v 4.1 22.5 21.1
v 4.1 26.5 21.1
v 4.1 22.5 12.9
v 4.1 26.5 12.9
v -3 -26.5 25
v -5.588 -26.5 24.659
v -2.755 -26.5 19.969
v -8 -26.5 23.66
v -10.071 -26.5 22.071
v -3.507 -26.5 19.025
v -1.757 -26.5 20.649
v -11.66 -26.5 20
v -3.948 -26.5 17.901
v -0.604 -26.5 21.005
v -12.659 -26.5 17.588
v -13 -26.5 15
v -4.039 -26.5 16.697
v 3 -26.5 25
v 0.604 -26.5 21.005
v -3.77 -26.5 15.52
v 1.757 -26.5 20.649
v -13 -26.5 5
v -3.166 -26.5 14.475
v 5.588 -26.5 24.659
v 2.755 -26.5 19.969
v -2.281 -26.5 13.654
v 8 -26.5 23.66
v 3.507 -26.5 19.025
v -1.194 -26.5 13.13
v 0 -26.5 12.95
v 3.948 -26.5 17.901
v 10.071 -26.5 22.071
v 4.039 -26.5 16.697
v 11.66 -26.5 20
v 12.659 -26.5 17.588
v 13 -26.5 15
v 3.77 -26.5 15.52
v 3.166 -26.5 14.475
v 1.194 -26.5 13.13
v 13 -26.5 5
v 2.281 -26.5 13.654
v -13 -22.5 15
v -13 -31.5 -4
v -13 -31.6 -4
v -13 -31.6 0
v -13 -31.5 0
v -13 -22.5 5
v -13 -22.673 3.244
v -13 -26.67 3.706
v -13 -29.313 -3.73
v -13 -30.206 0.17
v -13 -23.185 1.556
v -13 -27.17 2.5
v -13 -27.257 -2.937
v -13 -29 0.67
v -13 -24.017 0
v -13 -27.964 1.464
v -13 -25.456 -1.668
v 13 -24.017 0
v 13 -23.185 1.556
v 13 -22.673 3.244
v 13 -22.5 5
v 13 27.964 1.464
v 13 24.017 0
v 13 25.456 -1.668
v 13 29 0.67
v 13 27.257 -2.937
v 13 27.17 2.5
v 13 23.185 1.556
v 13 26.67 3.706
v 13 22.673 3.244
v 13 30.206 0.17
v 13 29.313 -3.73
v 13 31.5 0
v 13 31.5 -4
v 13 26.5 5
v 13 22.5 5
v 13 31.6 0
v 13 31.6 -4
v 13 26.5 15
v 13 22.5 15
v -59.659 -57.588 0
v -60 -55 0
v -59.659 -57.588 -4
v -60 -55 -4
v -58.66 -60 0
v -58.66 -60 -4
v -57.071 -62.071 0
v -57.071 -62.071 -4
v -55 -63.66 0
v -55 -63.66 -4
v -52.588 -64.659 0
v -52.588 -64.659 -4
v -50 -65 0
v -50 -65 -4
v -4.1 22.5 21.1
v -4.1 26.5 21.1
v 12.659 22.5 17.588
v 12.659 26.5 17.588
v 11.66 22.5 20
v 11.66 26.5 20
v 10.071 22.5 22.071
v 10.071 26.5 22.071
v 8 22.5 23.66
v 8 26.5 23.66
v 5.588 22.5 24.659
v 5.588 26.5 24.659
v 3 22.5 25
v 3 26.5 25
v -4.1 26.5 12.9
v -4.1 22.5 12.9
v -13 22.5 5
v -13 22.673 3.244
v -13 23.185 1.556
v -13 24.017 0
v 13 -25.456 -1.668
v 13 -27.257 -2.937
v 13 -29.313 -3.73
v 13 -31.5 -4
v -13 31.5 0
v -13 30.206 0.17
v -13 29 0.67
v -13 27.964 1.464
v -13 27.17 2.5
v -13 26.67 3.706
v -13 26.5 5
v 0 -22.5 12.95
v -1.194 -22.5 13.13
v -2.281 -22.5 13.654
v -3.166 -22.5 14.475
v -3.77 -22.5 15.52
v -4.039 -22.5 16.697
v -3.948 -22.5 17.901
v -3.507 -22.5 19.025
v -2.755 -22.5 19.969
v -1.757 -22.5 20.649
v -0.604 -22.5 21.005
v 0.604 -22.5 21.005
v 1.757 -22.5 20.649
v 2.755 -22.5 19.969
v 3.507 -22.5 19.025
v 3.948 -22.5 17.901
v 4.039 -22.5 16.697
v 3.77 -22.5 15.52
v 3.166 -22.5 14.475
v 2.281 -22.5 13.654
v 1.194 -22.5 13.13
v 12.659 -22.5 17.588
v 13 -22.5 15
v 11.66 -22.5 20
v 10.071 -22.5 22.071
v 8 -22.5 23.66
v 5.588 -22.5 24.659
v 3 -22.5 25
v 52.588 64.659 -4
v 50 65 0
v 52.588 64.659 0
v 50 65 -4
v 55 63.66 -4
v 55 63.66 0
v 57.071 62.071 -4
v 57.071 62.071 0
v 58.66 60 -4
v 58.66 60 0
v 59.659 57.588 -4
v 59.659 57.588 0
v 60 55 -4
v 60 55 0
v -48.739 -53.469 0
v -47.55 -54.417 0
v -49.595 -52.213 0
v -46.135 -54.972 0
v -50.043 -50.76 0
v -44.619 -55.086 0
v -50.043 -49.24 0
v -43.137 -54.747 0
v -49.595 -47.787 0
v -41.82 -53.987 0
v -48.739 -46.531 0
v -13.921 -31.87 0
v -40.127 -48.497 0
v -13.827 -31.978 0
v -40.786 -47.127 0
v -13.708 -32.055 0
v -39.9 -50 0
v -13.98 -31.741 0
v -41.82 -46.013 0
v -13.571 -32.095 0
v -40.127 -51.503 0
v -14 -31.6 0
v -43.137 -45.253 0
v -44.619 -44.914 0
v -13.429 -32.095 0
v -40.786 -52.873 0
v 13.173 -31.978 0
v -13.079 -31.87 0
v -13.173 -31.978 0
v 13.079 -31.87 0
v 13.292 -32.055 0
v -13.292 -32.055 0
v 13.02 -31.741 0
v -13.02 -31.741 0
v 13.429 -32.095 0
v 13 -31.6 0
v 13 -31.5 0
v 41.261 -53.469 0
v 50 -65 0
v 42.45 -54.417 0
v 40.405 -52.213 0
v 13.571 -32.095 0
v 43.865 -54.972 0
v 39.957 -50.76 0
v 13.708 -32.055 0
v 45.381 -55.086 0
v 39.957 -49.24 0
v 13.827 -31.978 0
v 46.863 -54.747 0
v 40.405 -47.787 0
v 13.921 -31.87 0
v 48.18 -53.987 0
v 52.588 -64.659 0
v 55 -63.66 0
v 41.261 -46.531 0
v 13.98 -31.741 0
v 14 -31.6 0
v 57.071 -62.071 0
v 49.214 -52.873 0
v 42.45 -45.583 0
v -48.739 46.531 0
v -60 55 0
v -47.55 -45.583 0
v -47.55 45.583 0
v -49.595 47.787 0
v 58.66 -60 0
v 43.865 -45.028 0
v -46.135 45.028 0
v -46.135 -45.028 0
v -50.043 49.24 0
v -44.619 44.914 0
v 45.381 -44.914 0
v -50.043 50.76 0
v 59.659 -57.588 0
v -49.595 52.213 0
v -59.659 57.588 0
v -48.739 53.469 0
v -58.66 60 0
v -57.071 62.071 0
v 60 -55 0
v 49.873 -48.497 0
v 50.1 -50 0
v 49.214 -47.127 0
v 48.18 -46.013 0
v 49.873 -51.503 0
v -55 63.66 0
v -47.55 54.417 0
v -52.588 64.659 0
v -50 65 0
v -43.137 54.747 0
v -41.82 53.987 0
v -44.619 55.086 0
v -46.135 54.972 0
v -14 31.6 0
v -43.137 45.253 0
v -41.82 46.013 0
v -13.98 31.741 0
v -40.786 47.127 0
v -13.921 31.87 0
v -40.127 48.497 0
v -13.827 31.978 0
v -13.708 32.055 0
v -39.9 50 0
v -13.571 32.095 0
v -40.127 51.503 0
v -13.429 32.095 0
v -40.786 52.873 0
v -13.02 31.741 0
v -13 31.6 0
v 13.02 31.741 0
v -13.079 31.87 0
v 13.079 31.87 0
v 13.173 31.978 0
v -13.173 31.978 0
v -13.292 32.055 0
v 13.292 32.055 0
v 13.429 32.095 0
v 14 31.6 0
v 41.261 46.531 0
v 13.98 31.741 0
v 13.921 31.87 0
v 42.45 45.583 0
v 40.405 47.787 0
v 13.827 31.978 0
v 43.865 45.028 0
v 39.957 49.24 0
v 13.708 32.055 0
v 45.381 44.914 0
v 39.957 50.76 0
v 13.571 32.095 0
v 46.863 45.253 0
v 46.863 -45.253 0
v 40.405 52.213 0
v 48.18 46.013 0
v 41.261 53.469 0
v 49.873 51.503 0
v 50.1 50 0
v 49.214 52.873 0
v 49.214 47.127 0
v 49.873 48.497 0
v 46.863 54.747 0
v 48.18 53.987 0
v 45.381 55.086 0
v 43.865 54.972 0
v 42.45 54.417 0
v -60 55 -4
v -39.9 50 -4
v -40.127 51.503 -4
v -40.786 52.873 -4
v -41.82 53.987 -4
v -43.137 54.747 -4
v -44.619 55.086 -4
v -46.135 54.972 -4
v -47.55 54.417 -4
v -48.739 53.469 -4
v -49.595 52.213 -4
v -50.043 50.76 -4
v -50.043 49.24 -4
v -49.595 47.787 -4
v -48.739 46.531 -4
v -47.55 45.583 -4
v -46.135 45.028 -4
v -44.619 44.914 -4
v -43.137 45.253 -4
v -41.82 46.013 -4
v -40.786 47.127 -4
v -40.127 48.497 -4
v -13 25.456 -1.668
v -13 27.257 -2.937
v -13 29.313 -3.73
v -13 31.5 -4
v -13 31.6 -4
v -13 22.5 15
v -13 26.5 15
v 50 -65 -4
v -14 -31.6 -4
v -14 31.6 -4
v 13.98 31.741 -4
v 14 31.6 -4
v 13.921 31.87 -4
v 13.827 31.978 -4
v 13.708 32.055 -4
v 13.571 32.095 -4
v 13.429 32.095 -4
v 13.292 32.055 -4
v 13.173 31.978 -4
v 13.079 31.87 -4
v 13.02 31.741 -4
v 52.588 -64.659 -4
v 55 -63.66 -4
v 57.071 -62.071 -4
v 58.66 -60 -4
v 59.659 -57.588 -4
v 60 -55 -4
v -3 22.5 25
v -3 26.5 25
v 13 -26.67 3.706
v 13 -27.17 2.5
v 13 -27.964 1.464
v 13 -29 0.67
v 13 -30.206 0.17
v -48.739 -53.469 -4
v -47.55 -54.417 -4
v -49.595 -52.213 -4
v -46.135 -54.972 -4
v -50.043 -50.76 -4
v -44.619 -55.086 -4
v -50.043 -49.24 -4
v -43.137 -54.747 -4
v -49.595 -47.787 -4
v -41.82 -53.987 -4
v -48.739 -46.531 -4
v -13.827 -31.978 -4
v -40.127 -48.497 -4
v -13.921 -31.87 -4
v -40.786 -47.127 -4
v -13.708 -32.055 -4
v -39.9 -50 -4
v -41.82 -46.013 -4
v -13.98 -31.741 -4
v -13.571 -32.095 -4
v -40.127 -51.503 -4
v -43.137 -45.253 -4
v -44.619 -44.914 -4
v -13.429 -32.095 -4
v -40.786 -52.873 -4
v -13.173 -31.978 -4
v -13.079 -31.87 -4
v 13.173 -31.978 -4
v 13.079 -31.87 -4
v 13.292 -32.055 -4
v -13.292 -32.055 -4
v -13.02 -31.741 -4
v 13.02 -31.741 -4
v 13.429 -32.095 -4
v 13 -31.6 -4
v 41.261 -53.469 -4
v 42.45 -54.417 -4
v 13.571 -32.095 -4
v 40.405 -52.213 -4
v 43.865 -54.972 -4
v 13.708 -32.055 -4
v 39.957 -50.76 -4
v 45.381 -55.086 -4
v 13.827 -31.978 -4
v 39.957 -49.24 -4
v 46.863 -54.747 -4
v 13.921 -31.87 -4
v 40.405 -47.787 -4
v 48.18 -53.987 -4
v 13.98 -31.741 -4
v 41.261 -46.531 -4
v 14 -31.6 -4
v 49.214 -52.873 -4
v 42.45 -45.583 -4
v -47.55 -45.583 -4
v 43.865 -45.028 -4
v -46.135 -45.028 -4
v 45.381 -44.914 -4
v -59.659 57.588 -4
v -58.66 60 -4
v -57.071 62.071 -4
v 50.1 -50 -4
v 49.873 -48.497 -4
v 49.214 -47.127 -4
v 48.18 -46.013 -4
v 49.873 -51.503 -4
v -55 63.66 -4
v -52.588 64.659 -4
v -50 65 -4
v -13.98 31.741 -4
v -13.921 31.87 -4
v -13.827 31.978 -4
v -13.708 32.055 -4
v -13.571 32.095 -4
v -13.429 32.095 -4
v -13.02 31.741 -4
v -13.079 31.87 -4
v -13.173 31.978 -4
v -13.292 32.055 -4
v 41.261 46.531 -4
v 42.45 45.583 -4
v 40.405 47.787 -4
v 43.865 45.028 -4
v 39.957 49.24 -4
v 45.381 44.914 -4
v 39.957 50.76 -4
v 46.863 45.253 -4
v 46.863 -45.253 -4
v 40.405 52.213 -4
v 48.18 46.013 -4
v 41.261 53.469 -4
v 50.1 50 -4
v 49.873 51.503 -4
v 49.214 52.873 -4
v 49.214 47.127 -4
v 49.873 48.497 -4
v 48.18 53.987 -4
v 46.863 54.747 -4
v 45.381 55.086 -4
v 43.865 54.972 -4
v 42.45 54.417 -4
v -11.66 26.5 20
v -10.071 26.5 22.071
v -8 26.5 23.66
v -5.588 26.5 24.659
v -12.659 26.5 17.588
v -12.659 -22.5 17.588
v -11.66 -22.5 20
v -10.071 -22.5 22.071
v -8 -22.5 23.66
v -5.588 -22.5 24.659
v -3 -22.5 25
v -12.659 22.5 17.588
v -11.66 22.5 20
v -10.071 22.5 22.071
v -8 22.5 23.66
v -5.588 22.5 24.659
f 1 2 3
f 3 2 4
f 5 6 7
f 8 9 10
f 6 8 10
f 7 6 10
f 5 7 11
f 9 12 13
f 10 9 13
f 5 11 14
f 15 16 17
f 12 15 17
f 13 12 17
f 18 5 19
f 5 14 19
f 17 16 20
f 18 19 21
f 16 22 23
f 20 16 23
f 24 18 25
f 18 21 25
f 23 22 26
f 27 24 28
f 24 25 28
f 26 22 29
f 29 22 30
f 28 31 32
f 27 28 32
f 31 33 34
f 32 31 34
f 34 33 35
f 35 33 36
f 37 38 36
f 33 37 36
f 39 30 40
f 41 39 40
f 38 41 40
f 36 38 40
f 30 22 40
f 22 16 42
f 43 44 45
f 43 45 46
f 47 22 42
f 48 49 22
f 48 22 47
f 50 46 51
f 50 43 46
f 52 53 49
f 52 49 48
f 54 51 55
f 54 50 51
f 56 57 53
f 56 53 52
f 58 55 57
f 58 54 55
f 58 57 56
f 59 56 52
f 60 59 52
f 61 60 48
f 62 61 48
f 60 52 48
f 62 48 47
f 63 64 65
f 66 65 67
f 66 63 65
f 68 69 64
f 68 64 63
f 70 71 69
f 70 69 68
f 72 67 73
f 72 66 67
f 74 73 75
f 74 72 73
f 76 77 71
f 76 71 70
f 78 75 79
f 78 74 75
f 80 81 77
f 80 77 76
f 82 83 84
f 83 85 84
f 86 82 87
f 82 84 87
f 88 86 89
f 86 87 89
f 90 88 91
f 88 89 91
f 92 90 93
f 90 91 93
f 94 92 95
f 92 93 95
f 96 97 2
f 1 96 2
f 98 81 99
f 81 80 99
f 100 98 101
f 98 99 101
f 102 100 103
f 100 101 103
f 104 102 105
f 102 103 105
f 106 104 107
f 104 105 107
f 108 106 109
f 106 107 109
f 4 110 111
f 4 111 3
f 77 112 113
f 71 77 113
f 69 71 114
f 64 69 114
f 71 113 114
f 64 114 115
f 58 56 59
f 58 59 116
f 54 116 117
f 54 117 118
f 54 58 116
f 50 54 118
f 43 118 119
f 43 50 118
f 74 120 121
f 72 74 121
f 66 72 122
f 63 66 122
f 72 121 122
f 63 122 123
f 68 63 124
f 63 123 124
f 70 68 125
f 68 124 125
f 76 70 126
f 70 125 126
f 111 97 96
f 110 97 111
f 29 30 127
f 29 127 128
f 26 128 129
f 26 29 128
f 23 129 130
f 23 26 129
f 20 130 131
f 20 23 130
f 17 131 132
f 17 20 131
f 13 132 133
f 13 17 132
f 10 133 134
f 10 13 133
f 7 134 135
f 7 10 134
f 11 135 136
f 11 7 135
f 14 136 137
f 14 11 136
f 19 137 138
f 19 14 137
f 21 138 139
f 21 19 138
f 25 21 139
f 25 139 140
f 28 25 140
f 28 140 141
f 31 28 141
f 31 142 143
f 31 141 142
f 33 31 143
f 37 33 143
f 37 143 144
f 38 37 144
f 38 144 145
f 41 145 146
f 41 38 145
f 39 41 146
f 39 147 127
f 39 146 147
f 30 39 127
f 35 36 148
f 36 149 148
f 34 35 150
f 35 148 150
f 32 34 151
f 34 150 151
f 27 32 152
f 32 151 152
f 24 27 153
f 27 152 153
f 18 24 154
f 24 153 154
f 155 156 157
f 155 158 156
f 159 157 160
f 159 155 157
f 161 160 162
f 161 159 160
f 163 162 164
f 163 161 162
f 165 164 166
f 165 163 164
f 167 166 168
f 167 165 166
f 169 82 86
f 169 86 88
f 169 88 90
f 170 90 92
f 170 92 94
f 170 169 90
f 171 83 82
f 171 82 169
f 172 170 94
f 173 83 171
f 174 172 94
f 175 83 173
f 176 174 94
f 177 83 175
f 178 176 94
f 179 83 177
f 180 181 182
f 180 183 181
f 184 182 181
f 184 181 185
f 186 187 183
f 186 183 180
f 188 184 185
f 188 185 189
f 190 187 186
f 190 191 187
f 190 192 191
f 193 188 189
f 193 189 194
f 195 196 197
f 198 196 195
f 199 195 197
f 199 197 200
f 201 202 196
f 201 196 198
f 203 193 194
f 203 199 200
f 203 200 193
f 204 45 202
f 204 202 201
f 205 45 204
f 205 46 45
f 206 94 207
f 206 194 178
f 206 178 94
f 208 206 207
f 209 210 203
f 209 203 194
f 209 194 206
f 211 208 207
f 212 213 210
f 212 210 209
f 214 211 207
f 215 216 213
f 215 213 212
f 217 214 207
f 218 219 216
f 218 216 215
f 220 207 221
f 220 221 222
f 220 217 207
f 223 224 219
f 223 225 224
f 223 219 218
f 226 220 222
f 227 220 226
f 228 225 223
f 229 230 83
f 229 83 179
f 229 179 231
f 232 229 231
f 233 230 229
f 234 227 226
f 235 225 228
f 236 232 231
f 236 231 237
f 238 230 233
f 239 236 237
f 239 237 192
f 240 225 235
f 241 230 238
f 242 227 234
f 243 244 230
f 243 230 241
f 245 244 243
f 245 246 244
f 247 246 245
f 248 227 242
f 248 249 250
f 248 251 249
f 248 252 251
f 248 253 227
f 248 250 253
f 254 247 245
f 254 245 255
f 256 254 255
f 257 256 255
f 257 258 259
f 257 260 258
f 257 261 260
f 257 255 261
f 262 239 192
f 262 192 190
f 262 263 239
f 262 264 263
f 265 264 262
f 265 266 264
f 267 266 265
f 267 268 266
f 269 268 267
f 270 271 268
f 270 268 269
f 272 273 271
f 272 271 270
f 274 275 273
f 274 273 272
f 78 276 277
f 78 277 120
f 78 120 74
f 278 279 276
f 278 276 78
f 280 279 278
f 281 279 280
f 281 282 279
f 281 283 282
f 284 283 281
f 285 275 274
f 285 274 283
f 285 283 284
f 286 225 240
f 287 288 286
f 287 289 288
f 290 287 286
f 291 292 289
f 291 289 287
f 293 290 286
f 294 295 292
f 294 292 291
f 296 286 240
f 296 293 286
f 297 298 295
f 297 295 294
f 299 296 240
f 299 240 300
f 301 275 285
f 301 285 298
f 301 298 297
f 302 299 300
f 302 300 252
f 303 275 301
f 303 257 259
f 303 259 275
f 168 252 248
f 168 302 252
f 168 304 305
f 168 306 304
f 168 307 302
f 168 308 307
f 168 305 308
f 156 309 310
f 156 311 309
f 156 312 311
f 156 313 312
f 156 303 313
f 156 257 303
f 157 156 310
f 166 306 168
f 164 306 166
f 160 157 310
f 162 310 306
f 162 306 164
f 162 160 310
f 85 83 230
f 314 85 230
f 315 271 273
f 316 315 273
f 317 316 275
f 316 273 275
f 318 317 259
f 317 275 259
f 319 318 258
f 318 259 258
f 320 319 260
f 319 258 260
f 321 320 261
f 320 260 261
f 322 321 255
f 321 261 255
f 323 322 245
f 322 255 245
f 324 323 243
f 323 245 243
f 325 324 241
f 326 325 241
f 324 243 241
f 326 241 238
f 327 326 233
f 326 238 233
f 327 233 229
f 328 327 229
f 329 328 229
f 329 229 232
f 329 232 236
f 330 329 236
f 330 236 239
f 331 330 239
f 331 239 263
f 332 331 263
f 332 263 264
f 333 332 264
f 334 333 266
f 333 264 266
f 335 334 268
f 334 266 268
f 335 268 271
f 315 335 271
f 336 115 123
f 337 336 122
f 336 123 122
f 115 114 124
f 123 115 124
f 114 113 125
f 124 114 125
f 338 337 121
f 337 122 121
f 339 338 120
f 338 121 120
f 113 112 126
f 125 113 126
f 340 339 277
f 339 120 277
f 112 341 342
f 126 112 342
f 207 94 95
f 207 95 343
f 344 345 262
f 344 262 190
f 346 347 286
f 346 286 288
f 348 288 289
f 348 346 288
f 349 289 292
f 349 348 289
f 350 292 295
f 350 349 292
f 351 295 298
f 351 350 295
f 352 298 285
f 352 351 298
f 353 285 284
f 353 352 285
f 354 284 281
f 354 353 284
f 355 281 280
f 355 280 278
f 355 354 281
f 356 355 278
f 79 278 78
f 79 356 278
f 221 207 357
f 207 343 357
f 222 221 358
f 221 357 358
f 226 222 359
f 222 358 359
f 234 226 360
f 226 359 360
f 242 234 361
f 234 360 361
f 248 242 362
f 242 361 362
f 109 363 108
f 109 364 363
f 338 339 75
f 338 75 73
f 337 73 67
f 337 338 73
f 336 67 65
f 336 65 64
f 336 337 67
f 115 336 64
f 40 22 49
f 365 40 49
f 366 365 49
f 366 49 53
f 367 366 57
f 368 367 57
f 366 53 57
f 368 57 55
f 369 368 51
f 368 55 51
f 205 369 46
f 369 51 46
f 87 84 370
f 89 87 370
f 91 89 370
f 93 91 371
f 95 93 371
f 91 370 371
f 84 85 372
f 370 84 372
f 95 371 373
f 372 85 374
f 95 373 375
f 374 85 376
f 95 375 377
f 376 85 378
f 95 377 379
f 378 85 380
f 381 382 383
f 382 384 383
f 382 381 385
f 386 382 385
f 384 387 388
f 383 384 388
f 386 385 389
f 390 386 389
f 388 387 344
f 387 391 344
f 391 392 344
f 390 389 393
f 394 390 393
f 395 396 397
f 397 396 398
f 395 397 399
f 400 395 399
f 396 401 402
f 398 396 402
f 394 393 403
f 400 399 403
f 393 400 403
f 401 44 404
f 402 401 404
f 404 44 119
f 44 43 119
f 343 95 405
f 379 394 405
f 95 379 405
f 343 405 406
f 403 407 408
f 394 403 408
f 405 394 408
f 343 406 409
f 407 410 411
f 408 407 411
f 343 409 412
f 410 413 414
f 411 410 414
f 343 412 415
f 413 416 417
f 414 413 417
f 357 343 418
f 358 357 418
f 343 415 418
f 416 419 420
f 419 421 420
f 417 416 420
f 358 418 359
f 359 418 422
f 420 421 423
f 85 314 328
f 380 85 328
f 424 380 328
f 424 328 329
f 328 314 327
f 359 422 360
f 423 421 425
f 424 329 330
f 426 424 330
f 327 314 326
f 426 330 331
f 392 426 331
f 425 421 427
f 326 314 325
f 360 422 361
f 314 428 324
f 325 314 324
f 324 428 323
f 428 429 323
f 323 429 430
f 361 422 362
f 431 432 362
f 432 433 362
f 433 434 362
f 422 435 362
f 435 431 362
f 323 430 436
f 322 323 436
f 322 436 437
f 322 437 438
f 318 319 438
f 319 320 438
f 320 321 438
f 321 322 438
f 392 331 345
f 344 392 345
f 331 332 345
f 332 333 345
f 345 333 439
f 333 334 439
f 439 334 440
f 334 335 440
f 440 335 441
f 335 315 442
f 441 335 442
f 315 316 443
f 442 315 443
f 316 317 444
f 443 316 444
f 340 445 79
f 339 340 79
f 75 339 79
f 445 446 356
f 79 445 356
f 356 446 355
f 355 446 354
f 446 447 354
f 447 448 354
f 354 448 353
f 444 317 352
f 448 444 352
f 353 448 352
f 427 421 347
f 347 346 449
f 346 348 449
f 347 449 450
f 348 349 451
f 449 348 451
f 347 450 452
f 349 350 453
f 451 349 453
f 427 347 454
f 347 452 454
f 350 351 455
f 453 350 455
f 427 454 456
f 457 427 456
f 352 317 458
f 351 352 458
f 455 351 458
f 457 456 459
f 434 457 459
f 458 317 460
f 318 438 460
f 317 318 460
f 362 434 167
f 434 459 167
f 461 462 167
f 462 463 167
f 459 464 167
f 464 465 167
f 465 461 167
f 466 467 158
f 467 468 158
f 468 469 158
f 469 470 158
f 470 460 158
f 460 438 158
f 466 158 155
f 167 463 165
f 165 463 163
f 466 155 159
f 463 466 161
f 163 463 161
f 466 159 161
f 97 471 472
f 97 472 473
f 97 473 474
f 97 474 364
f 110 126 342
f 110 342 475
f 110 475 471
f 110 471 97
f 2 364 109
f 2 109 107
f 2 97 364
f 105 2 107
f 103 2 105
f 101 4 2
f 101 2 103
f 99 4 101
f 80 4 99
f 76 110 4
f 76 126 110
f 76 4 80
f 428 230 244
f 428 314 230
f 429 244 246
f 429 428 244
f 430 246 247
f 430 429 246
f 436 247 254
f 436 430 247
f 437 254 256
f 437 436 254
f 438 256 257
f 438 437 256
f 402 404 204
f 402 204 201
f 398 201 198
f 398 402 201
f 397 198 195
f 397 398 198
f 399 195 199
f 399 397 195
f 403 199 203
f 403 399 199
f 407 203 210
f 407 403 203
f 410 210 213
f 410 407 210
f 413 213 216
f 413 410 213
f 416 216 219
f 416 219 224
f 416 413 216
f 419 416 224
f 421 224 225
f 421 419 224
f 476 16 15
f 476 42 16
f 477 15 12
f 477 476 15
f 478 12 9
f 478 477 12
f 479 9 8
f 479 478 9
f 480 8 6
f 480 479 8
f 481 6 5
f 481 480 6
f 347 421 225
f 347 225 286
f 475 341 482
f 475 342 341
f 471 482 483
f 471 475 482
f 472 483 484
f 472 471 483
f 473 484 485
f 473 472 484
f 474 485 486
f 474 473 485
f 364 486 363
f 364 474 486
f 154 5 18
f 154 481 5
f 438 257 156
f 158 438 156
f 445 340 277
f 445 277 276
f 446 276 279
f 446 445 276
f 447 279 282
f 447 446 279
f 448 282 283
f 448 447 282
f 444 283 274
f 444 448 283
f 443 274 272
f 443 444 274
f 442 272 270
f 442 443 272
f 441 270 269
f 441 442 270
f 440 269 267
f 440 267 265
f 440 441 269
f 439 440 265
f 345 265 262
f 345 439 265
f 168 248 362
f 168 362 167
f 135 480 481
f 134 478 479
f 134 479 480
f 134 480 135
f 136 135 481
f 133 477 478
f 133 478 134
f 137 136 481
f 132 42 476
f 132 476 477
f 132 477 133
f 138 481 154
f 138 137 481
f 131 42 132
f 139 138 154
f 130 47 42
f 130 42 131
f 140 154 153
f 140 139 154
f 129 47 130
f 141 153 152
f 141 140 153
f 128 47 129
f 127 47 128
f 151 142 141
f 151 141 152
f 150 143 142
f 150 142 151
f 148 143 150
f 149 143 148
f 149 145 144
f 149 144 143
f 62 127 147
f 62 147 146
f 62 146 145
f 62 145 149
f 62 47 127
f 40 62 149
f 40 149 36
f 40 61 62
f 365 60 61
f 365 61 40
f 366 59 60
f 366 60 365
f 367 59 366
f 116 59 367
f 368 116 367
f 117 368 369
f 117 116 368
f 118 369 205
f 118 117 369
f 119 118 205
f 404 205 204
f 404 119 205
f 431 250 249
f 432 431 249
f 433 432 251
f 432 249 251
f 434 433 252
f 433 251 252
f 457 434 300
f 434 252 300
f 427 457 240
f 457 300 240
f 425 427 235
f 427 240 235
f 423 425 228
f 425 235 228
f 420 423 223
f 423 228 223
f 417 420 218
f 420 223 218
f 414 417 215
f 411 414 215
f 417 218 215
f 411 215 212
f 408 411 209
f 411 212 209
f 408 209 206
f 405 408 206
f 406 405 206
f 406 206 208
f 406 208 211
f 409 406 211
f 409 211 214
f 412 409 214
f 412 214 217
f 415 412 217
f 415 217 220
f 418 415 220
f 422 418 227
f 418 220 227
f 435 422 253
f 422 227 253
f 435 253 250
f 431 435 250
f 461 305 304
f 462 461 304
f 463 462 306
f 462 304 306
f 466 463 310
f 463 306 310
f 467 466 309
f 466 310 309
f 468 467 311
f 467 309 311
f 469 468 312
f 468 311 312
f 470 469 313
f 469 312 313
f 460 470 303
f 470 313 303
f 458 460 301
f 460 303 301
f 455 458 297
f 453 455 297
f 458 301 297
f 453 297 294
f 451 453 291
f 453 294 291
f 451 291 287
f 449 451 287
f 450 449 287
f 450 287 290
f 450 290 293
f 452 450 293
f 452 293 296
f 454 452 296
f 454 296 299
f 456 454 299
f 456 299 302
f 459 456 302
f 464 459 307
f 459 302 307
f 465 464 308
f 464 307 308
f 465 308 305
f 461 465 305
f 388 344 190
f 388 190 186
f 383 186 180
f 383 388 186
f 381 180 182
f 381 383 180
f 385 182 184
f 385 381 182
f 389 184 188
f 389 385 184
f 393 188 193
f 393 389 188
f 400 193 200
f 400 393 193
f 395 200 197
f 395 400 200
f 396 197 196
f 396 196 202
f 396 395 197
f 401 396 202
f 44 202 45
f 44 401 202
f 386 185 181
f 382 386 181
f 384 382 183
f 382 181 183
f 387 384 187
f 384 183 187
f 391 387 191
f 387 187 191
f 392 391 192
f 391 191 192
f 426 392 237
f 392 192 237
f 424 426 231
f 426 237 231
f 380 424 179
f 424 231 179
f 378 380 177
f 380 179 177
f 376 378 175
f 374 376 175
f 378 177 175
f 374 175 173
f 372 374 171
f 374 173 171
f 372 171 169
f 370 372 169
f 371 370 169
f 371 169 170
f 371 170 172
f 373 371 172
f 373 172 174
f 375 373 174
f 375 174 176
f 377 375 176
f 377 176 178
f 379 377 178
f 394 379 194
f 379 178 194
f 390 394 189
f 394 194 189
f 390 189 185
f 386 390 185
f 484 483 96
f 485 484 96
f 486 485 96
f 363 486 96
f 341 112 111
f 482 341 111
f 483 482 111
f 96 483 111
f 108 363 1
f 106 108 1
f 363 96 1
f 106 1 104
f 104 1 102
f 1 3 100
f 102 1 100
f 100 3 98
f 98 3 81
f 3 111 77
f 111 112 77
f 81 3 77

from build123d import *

# Parameters (mm, degrees)
SKETCH_1_W                   = 120
SKETCH_1_H                   = 130
SKETCH_1_W_2                 = 28
SKETCH_1_H_2                 = 45
SM_BASE_FLANGE_1_DEPTH       = 4
SM_START                     = -4
SM_EDGE_FLANGE_1_DEPTH       = 4
SM_EDGE_FLANGE_1_2_OUTLINE_W = 26
SM_EDGE_FLANGE_1_2_OUTLINE_H = 4
SM_EDGE_FLANGE_1_2_DEPTH     = 0.41096
SM_START_2                   = 5
SM_EDGE_FLANGE_1_3_OUTLINE_W = 26
SM_EDGE_FLANGE_1_3_OUTLINE_H = 4
SM_EDGE_FLANGE_1_3_DEPTH     = 20
SM_START_3                   = -13
SM_EDGE_FLANGE_1_4_DEPTH     = 26
SM_EDGE_FLANGE_1_5_DEPTH     = 26
CUT_EXTRUDE_1_DEPTH          = 92.923881554
CUT_EXTRUDE_1_DEPTH_BACK     = 92.923881554
SKETCH_10_R                  = 4.05
SKETCH_12_W                  = 8.2
SKETCH_12_H                  = 8.2
CUT_EXTRUDE_3_DEPTH          = 4
FILLET_1_R                   = 10
SKETCH_11_R                  = 5.1
CUT_EXTRUDE_2_DEPTH          = 4


with BuildPart() as part:
    # Базовая кромка1: sheet metal written as solids
    # Sketch 1 → Базовая кромка1 (new body)
    with BuildSketch(Plane.XY):
        Rectangle(SKETCH_1_W, SKETCH_1_H)
        Rectangle(SKETCH_1_W_2, SKETCH_1_H_2, mode=Mode.SUBTRACT)
    extrude(amount=-SM_BASE_FLANGE_1_DEPTH)

    # Ребро-кромка1: read off the stored shape, not the designer's step
    # Ребро-кромка1 outline → Ребро-кромка1 (cut)
    with BuildSketch(Plane.XY.offset(SM_START)):
        with BuildLine():
            ThreePointArc((-13, 31.6), (-13.5, 32.1), (-14, 31.6))
            Line((-14, 31.6), (-14, 22.5))
            Line((-14, 22.5), (-13, 22.5))
            Line((-13, 22.5), (-13, 31.6))
        make_face()
        with BuildLine():
            Line((-13, -22.5), (-14, -22.5))
            Line((-14, -22.5), (-14, -31.6))
            ThreePointArc((-14, -31.6), (-13.5, -32.1), (-13, -31.6))
            Line((-13, -31.6), (-13, -22.5))
        make_face()
        with BuildLine():
            Line((13, 31.6), (13, 22.5))
            Line((13, 22.5), (14, 22.5))
            Line((14, 22.5), (14, 31.6))
            ThreePointArc((14, 31.6), (13.5, 32.1), (13, 31.6))
        make_face()
        with BuildLine():
            Line((14, -22.5), (13, -22.5))
            Line((13, -22.5), (13, -31.6))
            ThreePointArc((13, -31.6), (13.5, -32.1), (14, -31.6))
            Line((14, -31.6), (14, -22.5))
        make_face()
    extrude(amount=SM_EDGE_FLANGE_1_DEPTH, mode=Mode.SUBTRACT)

    # Sm Edge Flange 1 2 outline → Sm Edge Flange 1 2 (cut)
    with BuildSketch(Plane.XY.offset(SM_START)):
        with Locations((0, 24.5)):
            Rectangle(SM_EDGE_FLANGE_1_2_OUTLINE_W, SM_EDGE_FLANGE_1_2_OUTLINE_H)
        with Locations((0, -24.5)):
            Rectangle(SM_EDGE_FLANGE_1_2_OUTLINE_W, SM_EDGE_FLANGE_1_2_OUTLINE_H)
    extrude(amount=SM_EDGE_FLANGE_1_2_DEPTH, mode=Mode.SUBTRACT)

    # Sm Edge Flange 1 4 outline → Sm Edge Flange 1 4 (cut)
    with BuildSketch(Plane.YZ.offset(SM_START_3)):
        with BuildLine():
            ThreePointArc((31.5, -4), (27.257359313, -2.937253933), (24.016685226, 0))
            Line((24.016685226, 0), (22.5, 0))
            Line((22.5, 0), (22.5, -3.58904))
            Line((22.5, -3.58904), (26.5, -3.58904))
            Line((26.5, -3.58904), (26.5, -4))
            Line((26.5, -4), (31.5, -4))
        make_face()
        with BuildLine():
            Line((-22.5, -3.58904), (-22.5, 0))
            Line((-22.5, 0), (-24.016685226, 0))
            ThreePointArc((-24.016685226, 0), (-27.257359313, -2.937253933), (-31.5, -4))
            Line((-31.5, -4), (-26.5, -4))
            Line((-26.5, -4), (-26.5, -3.58904))
            Line((-26.5, -3.58904), (-22.5, -3.58904))
        make_face()
    extrude(amount=SM_EDGE_FLANGE_1_4_DEPTH, mode=Mode.SUBTRACT)



with BuildPart() as body_2:
    # Sm Edge Flange 1 3 outline → Sm Edge Flange 1 3 (new body)
    with BuildSketch(Plane.XY.offset(SM_START_2)):
        with Locations((0, 24.5)):
            Rectangle(SM_EDGE_FLANGE_1_3_OUTLINE_W, SM_EDGE_FLANGE_1_3_OUTLINE_H)
        with Locations((0, -24.5)):
            Rectangle(SM_EDGE_FLANGE_1_3_OUTLINE_W, SM_EDGE_FLANGE_1_3_OUTLINE_H)
    extrude(amount=SM_EDGE_FLANGE_1_3_DEPTH)


with BuildPart() as part_1:
    add(part.part)

    add(body_2.part)  # Sm Edge Flange 1 5 merges body 2
    # Sm Edge Flange 1 5 outline → Sm Edge Flange 1 5 (add)
    with BuildSketch(Plane.YZ.offset(SM_START_3)):
        with BuildLine():
            Line((26.5, 5), (22.5, 5))
            ThreePointArc((22.5, 5), (22.88751392, 2.38751392), (24.016685226, 0))
            Line((24.016685226, 0), (31.5, 0))
            ThreePointArc((31.5, 0), (27.964466094, 1.464466094), (26.5, 5))
        make_face()
        with BuildLine():
            Line((-31.5, 0), (-24.016685226, 0))
            ThreePointArc((-24.016685226, 0), (-22.88751392, 2.38751392), (-22.5, 5))
            Line((-22.5, 5), (-26.5, 5))
            ThreePointArc((-26.5, 5), (-27.964466094, 1.464466094), (-31.5, 0))
        make_face()
    extrude(amount=SM_EDGE_FLANGE_1_5_DEPTH)

    # Эскиз10 → Вырез-Вытянуть1 (cut, two sides: drawn at the far end of the back side and taken through both)
    with BuildSketch(Plane(origin=(0, 0, 0), x_dir=(1, 0, 0), z_dir=(0, 1, 0)).offset(-CUT_EXTRUDE_1_DEPTH_BACK)):
        with Locations(Location((0, -17, 0), (0, 0, 90))):
            Circle(SKETCH_10_R)
    extrude(amount=CUT_EXTRUDE_1_DEPTH + CUT_EXTRUDE_1_DEPTH_BACK, mode=Mode.SUBTRACT)

    # Эскиз12 → Вырез-Вытянуть3 (cut)
    with BuildSketch(Plane(origin=(0, 26.5, 0), x_dir=(1, 0, 0), z_dir=(0, 1, 0))):
        with Locations((0, -17)):
            Rectangle(SKETCH_12_W, SKETCH_12_H)
    extrude(amount=-CUT_EXTRUDE_3_DEPTH, mode=Mode.SUBTRACT)

    # Скругление1
    fillet_1_edges = [part_1.edges().sort_by_distance(p)[0] for p in [
        (13, -24.5, 25),
        (-13, -24.5, 25),
        (-60, 65, -2),
        (60, 65, -2),
        (60, -65, -2),
        (-60, -65, -2),
        (-13, 24.5, 25),
        (13, 24.5, 25),
    ]]
    fillet(fillet_1_edges, radius=FILLET_1_R)

    # Эскиз11 → Вырез-Вытянуть2 (cut)
    with BuildSketch(Plane.XY):
        with Locations((-45, 50)):
            Circle(SKETCH_11_R)
        with Locations((45, 50)):
            Circle(SKETCH_11_R)
        with Locations((-45, -50)):
            Circle(SKETCH_11_R)
        with Locations((45, -50)):
            Circle(SKETCH_11_R)
    extrude(amount=-CUT_EXTRUDE_2_DEPTH, mode=Mode.SUBTRACT)


solid = part_1.part
